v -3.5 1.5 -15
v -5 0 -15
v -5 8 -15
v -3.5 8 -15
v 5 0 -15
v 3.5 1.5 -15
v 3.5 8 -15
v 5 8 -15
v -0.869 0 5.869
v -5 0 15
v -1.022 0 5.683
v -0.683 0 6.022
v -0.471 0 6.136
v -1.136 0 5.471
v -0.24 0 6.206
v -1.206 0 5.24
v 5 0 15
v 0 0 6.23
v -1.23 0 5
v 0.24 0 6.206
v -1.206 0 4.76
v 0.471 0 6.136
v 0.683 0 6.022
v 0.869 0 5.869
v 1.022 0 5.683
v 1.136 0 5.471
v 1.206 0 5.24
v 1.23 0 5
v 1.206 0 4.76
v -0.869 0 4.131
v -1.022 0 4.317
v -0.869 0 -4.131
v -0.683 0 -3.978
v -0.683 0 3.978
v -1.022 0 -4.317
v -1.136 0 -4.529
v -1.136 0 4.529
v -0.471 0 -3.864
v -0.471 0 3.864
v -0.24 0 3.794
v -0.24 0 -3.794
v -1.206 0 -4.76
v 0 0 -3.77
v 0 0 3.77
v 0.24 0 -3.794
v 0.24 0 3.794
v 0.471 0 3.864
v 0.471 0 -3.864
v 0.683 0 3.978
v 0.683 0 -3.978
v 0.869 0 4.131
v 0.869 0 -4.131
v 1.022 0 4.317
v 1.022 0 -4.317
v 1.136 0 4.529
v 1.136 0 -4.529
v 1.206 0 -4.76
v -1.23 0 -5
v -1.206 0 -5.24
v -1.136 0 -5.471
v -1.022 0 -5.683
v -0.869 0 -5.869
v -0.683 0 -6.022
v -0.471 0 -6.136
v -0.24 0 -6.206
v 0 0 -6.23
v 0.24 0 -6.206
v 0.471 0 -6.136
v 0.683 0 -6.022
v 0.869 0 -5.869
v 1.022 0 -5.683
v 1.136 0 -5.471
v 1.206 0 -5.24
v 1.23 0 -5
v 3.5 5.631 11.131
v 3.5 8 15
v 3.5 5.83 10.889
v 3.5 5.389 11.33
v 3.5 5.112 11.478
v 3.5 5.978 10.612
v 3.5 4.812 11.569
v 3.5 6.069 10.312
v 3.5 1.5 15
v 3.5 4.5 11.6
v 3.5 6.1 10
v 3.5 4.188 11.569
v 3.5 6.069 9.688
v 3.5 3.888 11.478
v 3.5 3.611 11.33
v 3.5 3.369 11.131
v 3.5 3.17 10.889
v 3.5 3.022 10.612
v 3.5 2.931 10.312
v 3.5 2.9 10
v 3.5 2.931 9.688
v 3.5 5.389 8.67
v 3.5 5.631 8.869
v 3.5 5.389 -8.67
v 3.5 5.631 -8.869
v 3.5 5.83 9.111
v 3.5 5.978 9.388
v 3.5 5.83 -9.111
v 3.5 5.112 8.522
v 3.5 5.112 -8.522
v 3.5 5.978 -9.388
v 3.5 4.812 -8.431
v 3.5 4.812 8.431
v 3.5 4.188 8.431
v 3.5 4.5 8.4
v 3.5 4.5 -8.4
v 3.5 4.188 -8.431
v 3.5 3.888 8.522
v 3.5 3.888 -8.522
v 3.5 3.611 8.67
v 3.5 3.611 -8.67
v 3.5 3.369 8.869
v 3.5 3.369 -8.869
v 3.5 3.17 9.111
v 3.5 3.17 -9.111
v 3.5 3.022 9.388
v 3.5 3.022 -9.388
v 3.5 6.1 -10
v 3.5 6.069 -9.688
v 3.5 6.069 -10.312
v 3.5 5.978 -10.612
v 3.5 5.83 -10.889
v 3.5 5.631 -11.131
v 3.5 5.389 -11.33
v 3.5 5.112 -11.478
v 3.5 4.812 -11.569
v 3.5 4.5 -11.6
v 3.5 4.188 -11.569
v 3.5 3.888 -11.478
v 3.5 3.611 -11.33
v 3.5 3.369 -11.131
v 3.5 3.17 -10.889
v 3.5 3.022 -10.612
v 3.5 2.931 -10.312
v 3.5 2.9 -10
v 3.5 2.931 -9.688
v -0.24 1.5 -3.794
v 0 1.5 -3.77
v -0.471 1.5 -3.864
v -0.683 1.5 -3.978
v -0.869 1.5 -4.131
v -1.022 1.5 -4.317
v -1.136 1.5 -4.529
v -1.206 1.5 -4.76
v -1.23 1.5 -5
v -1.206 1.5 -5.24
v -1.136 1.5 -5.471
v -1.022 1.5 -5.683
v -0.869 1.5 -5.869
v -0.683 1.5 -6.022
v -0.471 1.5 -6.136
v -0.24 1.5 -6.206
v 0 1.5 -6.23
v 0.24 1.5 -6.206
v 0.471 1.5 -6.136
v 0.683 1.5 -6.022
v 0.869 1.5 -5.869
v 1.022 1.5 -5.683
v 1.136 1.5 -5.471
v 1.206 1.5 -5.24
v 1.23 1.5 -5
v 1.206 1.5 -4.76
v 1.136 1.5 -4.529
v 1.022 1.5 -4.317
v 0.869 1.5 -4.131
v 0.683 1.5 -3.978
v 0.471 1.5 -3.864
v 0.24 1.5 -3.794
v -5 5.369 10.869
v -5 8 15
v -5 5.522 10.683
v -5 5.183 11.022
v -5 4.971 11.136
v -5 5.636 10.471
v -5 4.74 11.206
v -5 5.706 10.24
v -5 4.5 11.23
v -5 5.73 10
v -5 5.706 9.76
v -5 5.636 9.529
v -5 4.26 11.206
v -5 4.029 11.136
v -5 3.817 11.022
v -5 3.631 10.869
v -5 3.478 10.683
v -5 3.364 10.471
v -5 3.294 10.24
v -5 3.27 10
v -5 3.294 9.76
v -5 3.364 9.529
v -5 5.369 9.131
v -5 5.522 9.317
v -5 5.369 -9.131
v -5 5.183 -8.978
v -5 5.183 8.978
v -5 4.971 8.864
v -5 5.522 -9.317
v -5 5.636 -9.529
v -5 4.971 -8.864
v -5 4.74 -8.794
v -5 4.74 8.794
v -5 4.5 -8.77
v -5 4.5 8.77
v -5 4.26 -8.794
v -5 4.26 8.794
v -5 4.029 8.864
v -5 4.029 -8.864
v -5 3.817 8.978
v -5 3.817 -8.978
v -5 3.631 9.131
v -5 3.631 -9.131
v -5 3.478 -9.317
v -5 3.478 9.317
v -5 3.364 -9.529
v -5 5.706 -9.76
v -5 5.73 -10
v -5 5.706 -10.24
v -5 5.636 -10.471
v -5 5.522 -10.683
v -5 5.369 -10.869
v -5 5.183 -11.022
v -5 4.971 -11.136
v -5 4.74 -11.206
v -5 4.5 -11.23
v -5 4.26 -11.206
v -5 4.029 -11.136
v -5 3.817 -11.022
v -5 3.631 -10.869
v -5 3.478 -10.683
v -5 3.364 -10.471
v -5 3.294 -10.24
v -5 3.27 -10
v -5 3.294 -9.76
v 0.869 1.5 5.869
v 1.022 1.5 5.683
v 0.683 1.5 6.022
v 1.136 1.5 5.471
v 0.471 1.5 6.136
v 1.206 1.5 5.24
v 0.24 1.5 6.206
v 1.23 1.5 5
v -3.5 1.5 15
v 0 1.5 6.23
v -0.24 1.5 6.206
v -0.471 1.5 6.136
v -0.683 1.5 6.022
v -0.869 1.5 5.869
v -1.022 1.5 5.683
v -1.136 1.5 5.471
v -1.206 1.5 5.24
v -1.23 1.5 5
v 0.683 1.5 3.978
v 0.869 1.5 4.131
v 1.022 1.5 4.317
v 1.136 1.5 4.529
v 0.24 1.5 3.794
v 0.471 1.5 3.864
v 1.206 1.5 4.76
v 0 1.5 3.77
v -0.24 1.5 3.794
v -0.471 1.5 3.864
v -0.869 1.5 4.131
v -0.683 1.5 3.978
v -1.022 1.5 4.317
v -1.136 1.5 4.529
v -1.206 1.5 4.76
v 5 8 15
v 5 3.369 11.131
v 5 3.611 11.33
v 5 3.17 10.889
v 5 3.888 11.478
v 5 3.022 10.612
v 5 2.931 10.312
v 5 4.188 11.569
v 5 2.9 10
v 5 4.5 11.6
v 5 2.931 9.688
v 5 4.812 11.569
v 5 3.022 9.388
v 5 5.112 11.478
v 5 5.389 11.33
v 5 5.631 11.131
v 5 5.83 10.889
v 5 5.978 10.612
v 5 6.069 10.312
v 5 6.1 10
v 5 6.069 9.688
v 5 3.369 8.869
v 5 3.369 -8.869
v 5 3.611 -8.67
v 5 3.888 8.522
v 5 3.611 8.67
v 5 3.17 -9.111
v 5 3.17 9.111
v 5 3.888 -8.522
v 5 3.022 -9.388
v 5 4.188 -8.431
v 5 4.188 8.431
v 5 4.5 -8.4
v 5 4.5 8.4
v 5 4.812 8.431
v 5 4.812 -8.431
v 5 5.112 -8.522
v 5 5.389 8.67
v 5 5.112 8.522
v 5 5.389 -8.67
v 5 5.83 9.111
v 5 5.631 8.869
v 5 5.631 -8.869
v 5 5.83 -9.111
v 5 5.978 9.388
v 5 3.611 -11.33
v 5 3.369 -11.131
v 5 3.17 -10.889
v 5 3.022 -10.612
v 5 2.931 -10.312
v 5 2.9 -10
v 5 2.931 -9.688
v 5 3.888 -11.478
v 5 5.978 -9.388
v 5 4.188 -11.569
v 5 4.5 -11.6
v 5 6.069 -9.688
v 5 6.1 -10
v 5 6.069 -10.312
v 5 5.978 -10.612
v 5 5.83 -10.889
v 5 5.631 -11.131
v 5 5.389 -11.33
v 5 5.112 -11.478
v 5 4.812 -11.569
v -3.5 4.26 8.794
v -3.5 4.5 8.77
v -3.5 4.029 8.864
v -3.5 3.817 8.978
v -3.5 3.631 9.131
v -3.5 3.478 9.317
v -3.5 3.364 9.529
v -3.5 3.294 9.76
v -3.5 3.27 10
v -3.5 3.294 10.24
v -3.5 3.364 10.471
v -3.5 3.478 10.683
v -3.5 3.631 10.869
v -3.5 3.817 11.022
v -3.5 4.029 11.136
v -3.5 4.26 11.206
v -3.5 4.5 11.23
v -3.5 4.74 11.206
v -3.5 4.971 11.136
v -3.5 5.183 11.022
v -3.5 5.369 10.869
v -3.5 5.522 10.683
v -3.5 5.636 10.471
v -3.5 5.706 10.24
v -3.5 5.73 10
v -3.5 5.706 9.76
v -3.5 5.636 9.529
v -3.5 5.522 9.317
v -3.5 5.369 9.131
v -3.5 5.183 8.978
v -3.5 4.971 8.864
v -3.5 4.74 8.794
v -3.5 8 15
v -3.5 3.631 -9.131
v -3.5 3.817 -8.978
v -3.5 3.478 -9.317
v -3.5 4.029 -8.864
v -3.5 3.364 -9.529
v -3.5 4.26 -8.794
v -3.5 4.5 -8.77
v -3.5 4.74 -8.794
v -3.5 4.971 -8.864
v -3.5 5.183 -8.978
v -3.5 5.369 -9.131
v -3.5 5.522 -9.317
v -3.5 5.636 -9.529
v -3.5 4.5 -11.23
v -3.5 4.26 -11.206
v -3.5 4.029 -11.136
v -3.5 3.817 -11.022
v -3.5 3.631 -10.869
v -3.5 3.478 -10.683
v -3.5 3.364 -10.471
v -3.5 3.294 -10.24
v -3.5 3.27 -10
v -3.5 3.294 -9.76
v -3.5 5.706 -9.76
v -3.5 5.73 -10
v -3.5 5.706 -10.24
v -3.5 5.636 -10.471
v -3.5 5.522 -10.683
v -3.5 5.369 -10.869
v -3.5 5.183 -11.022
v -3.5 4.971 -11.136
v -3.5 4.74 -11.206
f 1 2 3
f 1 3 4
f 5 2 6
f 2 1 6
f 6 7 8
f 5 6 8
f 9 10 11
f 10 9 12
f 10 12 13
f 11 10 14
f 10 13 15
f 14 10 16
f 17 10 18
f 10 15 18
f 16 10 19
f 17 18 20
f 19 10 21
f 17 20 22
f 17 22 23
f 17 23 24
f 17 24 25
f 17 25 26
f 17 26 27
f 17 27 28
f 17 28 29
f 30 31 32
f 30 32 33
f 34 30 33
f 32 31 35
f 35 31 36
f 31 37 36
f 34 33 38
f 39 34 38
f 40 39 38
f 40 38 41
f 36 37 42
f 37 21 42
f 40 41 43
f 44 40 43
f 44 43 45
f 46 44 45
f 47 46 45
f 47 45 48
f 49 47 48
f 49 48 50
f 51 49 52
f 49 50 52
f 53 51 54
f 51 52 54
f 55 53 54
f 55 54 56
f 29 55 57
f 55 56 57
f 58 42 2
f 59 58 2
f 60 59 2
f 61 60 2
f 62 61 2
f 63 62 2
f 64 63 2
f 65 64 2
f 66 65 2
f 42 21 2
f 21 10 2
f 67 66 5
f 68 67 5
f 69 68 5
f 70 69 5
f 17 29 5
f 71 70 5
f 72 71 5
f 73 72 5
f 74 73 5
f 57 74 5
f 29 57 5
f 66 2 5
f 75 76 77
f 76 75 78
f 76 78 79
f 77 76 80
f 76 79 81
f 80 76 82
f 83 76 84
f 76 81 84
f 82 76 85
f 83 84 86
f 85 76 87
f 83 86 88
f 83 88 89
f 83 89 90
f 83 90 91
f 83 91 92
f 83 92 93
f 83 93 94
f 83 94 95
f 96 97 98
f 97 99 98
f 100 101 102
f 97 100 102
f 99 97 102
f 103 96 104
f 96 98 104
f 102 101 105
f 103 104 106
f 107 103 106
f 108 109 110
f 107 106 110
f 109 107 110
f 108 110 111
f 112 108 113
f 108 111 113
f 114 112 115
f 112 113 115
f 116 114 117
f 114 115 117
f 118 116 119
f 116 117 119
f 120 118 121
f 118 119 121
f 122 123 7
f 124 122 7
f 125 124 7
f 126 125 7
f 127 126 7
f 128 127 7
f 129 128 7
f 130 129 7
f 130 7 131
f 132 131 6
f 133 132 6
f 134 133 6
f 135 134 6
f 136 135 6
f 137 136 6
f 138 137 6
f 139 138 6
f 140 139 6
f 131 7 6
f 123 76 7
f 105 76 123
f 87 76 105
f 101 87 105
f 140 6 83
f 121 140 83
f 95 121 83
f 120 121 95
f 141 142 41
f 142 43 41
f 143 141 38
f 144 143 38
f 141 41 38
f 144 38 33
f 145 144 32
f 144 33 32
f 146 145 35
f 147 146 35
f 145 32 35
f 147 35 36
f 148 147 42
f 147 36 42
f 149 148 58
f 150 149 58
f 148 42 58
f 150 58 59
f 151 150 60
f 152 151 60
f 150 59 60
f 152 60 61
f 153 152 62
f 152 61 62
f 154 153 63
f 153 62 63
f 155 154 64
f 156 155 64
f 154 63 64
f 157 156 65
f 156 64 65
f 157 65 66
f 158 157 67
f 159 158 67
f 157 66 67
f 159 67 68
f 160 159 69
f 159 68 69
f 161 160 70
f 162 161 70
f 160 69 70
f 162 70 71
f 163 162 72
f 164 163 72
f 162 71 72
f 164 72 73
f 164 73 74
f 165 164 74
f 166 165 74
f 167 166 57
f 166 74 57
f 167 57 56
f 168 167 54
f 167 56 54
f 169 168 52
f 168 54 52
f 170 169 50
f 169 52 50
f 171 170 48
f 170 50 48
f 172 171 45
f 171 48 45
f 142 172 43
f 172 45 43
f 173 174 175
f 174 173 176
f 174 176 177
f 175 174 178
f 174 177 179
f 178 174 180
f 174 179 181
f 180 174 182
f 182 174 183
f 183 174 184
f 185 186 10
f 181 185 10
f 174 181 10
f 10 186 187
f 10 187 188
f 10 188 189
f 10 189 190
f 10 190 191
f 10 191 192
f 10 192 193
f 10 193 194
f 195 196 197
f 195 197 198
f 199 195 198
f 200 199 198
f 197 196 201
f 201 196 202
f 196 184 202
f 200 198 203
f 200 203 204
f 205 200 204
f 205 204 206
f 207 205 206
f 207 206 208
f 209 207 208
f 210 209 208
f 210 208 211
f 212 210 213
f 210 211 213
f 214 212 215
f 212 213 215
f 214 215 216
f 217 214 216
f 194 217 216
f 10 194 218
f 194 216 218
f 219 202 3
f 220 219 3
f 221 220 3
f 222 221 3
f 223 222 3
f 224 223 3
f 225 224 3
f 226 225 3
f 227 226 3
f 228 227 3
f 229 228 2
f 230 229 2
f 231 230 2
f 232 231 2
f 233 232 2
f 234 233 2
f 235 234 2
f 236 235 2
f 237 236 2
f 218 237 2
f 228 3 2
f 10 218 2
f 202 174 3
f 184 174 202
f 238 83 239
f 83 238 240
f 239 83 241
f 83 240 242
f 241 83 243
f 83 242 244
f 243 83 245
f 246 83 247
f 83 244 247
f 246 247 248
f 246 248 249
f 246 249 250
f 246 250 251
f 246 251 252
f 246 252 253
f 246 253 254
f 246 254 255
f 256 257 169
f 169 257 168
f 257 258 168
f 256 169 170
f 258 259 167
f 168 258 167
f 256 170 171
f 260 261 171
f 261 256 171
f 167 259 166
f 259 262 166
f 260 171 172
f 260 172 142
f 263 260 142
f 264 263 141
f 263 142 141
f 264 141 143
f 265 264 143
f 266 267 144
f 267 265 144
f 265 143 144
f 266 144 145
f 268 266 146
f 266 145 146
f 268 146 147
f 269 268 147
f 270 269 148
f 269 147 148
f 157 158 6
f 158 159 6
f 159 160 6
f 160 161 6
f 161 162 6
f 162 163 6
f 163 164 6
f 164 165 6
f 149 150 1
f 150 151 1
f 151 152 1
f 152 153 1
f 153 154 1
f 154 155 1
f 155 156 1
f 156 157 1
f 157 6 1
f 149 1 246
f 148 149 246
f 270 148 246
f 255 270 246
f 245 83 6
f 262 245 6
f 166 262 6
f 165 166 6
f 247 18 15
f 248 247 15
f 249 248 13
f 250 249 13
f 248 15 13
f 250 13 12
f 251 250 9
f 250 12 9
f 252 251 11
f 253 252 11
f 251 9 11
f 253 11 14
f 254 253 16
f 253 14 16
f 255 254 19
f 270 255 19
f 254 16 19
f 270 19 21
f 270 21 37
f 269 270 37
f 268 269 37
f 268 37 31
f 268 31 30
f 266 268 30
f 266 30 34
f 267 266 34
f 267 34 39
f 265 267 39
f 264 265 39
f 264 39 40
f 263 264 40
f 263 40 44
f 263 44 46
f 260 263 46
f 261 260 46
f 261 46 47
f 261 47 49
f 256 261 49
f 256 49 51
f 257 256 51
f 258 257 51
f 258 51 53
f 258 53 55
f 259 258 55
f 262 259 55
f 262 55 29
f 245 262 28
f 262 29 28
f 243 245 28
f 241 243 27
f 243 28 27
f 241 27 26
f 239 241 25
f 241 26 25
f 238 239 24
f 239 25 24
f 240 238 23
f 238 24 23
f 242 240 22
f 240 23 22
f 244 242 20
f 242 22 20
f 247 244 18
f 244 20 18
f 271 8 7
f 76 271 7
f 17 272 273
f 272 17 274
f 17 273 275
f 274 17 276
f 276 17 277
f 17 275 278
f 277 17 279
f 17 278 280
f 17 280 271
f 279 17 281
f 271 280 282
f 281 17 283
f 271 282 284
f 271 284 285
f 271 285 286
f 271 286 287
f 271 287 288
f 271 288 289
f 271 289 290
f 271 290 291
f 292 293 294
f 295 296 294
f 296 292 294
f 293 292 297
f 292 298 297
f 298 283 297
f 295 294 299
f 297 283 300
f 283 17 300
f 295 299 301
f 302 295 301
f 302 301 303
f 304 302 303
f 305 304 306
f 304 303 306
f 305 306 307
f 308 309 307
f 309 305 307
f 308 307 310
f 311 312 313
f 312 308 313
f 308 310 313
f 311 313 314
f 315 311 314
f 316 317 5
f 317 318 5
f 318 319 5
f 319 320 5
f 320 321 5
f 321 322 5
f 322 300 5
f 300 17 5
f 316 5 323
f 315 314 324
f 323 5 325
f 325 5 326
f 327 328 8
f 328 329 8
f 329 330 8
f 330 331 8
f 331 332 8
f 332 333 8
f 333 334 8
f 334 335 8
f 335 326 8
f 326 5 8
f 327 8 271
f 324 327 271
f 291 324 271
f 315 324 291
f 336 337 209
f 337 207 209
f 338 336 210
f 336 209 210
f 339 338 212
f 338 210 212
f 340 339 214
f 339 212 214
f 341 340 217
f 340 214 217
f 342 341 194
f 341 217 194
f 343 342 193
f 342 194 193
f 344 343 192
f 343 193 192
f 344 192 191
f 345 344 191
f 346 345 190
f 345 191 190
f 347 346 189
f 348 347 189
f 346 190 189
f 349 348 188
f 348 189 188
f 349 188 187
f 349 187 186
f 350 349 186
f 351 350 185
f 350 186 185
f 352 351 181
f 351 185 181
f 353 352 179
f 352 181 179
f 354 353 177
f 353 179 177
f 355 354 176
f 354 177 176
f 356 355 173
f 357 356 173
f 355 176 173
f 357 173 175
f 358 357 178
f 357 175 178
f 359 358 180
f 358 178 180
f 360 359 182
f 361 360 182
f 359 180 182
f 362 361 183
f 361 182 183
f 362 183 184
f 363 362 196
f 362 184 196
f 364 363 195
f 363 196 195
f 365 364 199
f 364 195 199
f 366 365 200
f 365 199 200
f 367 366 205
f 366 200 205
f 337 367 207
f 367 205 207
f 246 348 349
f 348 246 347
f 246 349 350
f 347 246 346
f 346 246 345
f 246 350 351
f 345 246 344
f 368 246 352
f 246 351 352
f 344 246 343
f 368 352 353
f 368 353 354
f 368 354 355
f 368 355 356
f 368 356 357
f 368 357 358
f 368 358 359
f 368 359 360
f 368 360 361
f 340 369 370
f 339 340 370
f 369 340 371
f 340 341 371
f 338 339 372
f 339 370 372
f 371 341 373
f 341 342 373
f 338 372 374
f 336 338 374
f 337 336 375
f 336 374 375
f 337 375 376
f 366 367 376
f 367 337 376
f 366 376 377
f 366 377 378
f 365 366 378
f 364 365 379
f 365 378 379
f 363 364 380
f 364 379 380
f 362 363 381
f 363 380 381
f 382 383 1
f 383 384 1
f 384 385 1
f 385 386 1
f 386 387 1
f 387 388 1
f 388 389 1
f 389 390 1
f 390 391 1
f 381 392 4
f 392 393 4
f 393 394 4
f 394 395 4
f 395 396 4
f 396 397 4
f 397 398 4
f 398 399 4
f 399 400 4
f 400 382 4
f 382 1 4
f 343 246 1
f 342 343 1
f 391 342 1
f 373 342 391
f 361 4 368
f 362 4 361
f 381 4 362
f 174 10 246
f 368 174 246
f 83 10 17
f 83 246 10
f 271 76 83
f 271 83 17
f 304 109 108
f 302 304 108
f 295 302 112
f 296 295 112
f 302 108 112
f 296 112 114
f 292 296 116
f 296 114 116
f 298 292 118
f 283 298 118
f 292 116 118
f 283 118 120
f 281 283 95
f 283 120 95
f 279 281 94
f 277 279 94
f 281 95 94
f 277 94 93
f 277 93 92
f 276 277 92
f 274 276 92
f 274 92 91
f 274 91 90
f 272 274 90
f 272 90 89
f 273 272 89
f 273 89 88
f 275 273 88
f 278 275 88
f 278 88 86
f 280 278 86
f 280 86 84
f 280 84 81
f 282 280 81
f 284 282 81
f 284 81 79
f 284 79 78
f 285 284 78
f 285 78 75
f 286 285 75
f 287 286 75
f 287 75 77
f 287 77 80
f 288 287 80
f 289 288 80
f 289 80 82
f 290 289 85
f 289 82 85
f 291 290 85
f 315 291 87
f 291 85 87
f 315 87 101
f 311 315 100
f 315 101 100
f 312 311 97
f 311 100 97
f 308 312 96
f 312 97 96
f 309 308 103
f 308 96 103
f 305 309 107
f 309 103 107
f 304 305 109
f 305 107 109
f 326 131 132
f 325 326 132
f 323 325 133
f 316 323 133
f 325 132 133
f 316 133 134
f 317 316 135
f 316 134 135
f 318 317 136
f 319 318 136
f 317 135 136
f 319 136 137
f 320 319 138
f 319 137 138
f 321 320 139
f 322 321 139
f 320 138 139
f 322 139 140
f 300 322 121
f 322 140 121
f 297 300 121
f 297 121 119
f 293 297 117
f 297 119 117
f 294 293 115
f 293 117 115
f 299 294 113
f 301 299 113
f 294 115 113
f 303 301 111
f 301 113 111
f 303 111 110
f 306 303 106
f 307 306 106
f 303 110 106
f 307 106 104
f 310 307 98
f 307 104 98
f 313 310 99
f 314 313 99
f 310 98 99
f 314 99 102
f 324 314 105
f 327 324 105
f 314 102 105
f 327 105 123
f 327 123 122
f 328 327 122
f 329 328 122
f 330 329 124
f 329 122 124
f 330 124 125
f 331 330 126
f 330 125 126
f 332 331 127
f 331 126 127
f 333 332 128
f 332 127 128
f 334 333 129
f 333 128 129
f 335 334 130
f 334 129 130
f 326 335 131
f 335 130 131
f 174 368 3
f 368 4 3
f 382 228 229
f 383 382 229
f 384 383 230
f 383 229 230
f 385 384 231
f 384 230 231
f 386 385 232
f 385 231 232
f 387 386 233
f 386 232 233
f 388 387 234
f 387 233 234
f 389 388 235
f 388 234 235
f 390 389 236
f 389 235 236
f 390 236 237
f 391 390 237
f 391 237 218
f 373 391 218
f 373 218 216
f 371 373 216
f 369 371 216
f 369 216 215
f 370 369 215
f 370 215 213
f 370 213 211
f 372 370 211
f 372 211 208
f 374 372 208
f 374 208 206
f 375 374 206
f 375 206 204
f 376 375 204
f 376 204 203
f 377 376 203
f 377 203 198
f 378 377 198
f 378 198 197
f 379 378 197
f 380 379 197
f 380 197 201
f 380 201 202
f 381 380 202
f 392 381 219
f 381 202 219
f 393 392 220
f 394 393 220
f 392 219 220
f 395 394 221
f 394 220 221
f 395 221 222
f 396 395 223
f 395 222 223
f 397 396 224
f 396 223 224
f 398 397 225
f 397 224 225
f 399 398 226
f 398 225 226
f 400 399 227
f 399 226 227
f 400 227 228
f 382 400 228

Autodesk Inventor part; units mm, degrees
ref_plane "YZ Plane" through (0, 0, 0) normal (1, 0, 0) x (0, 1, 0)
ref_plane "XZ Plane" through (0, 0, 0) normal (0, 1, 0) x (-1, 0, 0)
ref_plane "XY Plane" through (0, 0, 0) normal (0, 0, 1) x (1, 0, 0)
sketch "Náčrt1" plane through (0, 0, 0) normal (0, 0, 1) x (1, 0, 0)
  line L0 (-5, 8) -> (-5, 0)
  line L1 (-5, 0) -> (5, 0)
  line L2 (5, 0) -> (5, 8)
  line L3 (5, 8) -> (3.5, 8)
  line L4 (3.5, 8) -> (3.5, 1.5)
  line L5 (3.5, 1.5) -> (-3.5, 1.5)
  line L6 (-3.5, 1.5) -> (-3.5, 8)
  line L7 (-3.5, 8) -> (-5, 8)
  line L8 (-7, 0) -> (7, 0) projected
  line L9 (0, 9.6) -> (0, -1.6) projected
  point P0 (0, 0)
  dimension "d0" = 8
  dimension "d1" = 10
  dimension "d2" = 1.5
  dimension "d3" = 1.5
  dimension "d4" = 1.5
extrude "Vysunutí1" add sketch "Náčrt1" along normal mid plane 30
sketch "Náčrt2" plane through (5, 0, 15) normal (1, 0, 0) x (0, 0, -1)
  line L0 (30, 8) -> (30, 0) projected
  line L1 (0, 0) -> (0, 8) projected
  line L2 (30, 8) -> (0, 8) projected
  point P0 (15, 0)
  point P1 (5, 4.5)
  point P2 (25, 4.5)
  dimension "d7" = 5
  dimension "d8" = 5
  dimension "d9" = 3.5
  dimension "d10" = 3.5
hole "Díra1" at (5, 4.5, 10) at (5, 4.5, -10) direction (-1, 0, 0) diameter 2.459 end through all counterbore diameter 3.2 counterbore depth 2 thread size "M3x0.5" class "6H" standard "ISO Metric profile"
sketch "Náčrt3" plane through (-3.5, 1.5, 15) normal (0, 1, 0) x (1, 0, 0)
  line L0 (0, 30) -> (0, 0) projected
  point P0 (3.5, 15)
  point P1 (3.5, 10)
  point P2 (3.5, 20)
  dimension "d18" = 10
  dimension "d19" = 5
  dimension "d20" = 3.5
  dimension "d21" = 3.5
hole "Díra2" at (0, 1.5, 5) at (0, 1.5, -5) direction (0, -1, 0) diameter 2.459 end through all thread size "M3x0.5" class "6H" standard "ISO Metric profile"
properties part number "y_belt_anchor" material "Hliník 6061"
